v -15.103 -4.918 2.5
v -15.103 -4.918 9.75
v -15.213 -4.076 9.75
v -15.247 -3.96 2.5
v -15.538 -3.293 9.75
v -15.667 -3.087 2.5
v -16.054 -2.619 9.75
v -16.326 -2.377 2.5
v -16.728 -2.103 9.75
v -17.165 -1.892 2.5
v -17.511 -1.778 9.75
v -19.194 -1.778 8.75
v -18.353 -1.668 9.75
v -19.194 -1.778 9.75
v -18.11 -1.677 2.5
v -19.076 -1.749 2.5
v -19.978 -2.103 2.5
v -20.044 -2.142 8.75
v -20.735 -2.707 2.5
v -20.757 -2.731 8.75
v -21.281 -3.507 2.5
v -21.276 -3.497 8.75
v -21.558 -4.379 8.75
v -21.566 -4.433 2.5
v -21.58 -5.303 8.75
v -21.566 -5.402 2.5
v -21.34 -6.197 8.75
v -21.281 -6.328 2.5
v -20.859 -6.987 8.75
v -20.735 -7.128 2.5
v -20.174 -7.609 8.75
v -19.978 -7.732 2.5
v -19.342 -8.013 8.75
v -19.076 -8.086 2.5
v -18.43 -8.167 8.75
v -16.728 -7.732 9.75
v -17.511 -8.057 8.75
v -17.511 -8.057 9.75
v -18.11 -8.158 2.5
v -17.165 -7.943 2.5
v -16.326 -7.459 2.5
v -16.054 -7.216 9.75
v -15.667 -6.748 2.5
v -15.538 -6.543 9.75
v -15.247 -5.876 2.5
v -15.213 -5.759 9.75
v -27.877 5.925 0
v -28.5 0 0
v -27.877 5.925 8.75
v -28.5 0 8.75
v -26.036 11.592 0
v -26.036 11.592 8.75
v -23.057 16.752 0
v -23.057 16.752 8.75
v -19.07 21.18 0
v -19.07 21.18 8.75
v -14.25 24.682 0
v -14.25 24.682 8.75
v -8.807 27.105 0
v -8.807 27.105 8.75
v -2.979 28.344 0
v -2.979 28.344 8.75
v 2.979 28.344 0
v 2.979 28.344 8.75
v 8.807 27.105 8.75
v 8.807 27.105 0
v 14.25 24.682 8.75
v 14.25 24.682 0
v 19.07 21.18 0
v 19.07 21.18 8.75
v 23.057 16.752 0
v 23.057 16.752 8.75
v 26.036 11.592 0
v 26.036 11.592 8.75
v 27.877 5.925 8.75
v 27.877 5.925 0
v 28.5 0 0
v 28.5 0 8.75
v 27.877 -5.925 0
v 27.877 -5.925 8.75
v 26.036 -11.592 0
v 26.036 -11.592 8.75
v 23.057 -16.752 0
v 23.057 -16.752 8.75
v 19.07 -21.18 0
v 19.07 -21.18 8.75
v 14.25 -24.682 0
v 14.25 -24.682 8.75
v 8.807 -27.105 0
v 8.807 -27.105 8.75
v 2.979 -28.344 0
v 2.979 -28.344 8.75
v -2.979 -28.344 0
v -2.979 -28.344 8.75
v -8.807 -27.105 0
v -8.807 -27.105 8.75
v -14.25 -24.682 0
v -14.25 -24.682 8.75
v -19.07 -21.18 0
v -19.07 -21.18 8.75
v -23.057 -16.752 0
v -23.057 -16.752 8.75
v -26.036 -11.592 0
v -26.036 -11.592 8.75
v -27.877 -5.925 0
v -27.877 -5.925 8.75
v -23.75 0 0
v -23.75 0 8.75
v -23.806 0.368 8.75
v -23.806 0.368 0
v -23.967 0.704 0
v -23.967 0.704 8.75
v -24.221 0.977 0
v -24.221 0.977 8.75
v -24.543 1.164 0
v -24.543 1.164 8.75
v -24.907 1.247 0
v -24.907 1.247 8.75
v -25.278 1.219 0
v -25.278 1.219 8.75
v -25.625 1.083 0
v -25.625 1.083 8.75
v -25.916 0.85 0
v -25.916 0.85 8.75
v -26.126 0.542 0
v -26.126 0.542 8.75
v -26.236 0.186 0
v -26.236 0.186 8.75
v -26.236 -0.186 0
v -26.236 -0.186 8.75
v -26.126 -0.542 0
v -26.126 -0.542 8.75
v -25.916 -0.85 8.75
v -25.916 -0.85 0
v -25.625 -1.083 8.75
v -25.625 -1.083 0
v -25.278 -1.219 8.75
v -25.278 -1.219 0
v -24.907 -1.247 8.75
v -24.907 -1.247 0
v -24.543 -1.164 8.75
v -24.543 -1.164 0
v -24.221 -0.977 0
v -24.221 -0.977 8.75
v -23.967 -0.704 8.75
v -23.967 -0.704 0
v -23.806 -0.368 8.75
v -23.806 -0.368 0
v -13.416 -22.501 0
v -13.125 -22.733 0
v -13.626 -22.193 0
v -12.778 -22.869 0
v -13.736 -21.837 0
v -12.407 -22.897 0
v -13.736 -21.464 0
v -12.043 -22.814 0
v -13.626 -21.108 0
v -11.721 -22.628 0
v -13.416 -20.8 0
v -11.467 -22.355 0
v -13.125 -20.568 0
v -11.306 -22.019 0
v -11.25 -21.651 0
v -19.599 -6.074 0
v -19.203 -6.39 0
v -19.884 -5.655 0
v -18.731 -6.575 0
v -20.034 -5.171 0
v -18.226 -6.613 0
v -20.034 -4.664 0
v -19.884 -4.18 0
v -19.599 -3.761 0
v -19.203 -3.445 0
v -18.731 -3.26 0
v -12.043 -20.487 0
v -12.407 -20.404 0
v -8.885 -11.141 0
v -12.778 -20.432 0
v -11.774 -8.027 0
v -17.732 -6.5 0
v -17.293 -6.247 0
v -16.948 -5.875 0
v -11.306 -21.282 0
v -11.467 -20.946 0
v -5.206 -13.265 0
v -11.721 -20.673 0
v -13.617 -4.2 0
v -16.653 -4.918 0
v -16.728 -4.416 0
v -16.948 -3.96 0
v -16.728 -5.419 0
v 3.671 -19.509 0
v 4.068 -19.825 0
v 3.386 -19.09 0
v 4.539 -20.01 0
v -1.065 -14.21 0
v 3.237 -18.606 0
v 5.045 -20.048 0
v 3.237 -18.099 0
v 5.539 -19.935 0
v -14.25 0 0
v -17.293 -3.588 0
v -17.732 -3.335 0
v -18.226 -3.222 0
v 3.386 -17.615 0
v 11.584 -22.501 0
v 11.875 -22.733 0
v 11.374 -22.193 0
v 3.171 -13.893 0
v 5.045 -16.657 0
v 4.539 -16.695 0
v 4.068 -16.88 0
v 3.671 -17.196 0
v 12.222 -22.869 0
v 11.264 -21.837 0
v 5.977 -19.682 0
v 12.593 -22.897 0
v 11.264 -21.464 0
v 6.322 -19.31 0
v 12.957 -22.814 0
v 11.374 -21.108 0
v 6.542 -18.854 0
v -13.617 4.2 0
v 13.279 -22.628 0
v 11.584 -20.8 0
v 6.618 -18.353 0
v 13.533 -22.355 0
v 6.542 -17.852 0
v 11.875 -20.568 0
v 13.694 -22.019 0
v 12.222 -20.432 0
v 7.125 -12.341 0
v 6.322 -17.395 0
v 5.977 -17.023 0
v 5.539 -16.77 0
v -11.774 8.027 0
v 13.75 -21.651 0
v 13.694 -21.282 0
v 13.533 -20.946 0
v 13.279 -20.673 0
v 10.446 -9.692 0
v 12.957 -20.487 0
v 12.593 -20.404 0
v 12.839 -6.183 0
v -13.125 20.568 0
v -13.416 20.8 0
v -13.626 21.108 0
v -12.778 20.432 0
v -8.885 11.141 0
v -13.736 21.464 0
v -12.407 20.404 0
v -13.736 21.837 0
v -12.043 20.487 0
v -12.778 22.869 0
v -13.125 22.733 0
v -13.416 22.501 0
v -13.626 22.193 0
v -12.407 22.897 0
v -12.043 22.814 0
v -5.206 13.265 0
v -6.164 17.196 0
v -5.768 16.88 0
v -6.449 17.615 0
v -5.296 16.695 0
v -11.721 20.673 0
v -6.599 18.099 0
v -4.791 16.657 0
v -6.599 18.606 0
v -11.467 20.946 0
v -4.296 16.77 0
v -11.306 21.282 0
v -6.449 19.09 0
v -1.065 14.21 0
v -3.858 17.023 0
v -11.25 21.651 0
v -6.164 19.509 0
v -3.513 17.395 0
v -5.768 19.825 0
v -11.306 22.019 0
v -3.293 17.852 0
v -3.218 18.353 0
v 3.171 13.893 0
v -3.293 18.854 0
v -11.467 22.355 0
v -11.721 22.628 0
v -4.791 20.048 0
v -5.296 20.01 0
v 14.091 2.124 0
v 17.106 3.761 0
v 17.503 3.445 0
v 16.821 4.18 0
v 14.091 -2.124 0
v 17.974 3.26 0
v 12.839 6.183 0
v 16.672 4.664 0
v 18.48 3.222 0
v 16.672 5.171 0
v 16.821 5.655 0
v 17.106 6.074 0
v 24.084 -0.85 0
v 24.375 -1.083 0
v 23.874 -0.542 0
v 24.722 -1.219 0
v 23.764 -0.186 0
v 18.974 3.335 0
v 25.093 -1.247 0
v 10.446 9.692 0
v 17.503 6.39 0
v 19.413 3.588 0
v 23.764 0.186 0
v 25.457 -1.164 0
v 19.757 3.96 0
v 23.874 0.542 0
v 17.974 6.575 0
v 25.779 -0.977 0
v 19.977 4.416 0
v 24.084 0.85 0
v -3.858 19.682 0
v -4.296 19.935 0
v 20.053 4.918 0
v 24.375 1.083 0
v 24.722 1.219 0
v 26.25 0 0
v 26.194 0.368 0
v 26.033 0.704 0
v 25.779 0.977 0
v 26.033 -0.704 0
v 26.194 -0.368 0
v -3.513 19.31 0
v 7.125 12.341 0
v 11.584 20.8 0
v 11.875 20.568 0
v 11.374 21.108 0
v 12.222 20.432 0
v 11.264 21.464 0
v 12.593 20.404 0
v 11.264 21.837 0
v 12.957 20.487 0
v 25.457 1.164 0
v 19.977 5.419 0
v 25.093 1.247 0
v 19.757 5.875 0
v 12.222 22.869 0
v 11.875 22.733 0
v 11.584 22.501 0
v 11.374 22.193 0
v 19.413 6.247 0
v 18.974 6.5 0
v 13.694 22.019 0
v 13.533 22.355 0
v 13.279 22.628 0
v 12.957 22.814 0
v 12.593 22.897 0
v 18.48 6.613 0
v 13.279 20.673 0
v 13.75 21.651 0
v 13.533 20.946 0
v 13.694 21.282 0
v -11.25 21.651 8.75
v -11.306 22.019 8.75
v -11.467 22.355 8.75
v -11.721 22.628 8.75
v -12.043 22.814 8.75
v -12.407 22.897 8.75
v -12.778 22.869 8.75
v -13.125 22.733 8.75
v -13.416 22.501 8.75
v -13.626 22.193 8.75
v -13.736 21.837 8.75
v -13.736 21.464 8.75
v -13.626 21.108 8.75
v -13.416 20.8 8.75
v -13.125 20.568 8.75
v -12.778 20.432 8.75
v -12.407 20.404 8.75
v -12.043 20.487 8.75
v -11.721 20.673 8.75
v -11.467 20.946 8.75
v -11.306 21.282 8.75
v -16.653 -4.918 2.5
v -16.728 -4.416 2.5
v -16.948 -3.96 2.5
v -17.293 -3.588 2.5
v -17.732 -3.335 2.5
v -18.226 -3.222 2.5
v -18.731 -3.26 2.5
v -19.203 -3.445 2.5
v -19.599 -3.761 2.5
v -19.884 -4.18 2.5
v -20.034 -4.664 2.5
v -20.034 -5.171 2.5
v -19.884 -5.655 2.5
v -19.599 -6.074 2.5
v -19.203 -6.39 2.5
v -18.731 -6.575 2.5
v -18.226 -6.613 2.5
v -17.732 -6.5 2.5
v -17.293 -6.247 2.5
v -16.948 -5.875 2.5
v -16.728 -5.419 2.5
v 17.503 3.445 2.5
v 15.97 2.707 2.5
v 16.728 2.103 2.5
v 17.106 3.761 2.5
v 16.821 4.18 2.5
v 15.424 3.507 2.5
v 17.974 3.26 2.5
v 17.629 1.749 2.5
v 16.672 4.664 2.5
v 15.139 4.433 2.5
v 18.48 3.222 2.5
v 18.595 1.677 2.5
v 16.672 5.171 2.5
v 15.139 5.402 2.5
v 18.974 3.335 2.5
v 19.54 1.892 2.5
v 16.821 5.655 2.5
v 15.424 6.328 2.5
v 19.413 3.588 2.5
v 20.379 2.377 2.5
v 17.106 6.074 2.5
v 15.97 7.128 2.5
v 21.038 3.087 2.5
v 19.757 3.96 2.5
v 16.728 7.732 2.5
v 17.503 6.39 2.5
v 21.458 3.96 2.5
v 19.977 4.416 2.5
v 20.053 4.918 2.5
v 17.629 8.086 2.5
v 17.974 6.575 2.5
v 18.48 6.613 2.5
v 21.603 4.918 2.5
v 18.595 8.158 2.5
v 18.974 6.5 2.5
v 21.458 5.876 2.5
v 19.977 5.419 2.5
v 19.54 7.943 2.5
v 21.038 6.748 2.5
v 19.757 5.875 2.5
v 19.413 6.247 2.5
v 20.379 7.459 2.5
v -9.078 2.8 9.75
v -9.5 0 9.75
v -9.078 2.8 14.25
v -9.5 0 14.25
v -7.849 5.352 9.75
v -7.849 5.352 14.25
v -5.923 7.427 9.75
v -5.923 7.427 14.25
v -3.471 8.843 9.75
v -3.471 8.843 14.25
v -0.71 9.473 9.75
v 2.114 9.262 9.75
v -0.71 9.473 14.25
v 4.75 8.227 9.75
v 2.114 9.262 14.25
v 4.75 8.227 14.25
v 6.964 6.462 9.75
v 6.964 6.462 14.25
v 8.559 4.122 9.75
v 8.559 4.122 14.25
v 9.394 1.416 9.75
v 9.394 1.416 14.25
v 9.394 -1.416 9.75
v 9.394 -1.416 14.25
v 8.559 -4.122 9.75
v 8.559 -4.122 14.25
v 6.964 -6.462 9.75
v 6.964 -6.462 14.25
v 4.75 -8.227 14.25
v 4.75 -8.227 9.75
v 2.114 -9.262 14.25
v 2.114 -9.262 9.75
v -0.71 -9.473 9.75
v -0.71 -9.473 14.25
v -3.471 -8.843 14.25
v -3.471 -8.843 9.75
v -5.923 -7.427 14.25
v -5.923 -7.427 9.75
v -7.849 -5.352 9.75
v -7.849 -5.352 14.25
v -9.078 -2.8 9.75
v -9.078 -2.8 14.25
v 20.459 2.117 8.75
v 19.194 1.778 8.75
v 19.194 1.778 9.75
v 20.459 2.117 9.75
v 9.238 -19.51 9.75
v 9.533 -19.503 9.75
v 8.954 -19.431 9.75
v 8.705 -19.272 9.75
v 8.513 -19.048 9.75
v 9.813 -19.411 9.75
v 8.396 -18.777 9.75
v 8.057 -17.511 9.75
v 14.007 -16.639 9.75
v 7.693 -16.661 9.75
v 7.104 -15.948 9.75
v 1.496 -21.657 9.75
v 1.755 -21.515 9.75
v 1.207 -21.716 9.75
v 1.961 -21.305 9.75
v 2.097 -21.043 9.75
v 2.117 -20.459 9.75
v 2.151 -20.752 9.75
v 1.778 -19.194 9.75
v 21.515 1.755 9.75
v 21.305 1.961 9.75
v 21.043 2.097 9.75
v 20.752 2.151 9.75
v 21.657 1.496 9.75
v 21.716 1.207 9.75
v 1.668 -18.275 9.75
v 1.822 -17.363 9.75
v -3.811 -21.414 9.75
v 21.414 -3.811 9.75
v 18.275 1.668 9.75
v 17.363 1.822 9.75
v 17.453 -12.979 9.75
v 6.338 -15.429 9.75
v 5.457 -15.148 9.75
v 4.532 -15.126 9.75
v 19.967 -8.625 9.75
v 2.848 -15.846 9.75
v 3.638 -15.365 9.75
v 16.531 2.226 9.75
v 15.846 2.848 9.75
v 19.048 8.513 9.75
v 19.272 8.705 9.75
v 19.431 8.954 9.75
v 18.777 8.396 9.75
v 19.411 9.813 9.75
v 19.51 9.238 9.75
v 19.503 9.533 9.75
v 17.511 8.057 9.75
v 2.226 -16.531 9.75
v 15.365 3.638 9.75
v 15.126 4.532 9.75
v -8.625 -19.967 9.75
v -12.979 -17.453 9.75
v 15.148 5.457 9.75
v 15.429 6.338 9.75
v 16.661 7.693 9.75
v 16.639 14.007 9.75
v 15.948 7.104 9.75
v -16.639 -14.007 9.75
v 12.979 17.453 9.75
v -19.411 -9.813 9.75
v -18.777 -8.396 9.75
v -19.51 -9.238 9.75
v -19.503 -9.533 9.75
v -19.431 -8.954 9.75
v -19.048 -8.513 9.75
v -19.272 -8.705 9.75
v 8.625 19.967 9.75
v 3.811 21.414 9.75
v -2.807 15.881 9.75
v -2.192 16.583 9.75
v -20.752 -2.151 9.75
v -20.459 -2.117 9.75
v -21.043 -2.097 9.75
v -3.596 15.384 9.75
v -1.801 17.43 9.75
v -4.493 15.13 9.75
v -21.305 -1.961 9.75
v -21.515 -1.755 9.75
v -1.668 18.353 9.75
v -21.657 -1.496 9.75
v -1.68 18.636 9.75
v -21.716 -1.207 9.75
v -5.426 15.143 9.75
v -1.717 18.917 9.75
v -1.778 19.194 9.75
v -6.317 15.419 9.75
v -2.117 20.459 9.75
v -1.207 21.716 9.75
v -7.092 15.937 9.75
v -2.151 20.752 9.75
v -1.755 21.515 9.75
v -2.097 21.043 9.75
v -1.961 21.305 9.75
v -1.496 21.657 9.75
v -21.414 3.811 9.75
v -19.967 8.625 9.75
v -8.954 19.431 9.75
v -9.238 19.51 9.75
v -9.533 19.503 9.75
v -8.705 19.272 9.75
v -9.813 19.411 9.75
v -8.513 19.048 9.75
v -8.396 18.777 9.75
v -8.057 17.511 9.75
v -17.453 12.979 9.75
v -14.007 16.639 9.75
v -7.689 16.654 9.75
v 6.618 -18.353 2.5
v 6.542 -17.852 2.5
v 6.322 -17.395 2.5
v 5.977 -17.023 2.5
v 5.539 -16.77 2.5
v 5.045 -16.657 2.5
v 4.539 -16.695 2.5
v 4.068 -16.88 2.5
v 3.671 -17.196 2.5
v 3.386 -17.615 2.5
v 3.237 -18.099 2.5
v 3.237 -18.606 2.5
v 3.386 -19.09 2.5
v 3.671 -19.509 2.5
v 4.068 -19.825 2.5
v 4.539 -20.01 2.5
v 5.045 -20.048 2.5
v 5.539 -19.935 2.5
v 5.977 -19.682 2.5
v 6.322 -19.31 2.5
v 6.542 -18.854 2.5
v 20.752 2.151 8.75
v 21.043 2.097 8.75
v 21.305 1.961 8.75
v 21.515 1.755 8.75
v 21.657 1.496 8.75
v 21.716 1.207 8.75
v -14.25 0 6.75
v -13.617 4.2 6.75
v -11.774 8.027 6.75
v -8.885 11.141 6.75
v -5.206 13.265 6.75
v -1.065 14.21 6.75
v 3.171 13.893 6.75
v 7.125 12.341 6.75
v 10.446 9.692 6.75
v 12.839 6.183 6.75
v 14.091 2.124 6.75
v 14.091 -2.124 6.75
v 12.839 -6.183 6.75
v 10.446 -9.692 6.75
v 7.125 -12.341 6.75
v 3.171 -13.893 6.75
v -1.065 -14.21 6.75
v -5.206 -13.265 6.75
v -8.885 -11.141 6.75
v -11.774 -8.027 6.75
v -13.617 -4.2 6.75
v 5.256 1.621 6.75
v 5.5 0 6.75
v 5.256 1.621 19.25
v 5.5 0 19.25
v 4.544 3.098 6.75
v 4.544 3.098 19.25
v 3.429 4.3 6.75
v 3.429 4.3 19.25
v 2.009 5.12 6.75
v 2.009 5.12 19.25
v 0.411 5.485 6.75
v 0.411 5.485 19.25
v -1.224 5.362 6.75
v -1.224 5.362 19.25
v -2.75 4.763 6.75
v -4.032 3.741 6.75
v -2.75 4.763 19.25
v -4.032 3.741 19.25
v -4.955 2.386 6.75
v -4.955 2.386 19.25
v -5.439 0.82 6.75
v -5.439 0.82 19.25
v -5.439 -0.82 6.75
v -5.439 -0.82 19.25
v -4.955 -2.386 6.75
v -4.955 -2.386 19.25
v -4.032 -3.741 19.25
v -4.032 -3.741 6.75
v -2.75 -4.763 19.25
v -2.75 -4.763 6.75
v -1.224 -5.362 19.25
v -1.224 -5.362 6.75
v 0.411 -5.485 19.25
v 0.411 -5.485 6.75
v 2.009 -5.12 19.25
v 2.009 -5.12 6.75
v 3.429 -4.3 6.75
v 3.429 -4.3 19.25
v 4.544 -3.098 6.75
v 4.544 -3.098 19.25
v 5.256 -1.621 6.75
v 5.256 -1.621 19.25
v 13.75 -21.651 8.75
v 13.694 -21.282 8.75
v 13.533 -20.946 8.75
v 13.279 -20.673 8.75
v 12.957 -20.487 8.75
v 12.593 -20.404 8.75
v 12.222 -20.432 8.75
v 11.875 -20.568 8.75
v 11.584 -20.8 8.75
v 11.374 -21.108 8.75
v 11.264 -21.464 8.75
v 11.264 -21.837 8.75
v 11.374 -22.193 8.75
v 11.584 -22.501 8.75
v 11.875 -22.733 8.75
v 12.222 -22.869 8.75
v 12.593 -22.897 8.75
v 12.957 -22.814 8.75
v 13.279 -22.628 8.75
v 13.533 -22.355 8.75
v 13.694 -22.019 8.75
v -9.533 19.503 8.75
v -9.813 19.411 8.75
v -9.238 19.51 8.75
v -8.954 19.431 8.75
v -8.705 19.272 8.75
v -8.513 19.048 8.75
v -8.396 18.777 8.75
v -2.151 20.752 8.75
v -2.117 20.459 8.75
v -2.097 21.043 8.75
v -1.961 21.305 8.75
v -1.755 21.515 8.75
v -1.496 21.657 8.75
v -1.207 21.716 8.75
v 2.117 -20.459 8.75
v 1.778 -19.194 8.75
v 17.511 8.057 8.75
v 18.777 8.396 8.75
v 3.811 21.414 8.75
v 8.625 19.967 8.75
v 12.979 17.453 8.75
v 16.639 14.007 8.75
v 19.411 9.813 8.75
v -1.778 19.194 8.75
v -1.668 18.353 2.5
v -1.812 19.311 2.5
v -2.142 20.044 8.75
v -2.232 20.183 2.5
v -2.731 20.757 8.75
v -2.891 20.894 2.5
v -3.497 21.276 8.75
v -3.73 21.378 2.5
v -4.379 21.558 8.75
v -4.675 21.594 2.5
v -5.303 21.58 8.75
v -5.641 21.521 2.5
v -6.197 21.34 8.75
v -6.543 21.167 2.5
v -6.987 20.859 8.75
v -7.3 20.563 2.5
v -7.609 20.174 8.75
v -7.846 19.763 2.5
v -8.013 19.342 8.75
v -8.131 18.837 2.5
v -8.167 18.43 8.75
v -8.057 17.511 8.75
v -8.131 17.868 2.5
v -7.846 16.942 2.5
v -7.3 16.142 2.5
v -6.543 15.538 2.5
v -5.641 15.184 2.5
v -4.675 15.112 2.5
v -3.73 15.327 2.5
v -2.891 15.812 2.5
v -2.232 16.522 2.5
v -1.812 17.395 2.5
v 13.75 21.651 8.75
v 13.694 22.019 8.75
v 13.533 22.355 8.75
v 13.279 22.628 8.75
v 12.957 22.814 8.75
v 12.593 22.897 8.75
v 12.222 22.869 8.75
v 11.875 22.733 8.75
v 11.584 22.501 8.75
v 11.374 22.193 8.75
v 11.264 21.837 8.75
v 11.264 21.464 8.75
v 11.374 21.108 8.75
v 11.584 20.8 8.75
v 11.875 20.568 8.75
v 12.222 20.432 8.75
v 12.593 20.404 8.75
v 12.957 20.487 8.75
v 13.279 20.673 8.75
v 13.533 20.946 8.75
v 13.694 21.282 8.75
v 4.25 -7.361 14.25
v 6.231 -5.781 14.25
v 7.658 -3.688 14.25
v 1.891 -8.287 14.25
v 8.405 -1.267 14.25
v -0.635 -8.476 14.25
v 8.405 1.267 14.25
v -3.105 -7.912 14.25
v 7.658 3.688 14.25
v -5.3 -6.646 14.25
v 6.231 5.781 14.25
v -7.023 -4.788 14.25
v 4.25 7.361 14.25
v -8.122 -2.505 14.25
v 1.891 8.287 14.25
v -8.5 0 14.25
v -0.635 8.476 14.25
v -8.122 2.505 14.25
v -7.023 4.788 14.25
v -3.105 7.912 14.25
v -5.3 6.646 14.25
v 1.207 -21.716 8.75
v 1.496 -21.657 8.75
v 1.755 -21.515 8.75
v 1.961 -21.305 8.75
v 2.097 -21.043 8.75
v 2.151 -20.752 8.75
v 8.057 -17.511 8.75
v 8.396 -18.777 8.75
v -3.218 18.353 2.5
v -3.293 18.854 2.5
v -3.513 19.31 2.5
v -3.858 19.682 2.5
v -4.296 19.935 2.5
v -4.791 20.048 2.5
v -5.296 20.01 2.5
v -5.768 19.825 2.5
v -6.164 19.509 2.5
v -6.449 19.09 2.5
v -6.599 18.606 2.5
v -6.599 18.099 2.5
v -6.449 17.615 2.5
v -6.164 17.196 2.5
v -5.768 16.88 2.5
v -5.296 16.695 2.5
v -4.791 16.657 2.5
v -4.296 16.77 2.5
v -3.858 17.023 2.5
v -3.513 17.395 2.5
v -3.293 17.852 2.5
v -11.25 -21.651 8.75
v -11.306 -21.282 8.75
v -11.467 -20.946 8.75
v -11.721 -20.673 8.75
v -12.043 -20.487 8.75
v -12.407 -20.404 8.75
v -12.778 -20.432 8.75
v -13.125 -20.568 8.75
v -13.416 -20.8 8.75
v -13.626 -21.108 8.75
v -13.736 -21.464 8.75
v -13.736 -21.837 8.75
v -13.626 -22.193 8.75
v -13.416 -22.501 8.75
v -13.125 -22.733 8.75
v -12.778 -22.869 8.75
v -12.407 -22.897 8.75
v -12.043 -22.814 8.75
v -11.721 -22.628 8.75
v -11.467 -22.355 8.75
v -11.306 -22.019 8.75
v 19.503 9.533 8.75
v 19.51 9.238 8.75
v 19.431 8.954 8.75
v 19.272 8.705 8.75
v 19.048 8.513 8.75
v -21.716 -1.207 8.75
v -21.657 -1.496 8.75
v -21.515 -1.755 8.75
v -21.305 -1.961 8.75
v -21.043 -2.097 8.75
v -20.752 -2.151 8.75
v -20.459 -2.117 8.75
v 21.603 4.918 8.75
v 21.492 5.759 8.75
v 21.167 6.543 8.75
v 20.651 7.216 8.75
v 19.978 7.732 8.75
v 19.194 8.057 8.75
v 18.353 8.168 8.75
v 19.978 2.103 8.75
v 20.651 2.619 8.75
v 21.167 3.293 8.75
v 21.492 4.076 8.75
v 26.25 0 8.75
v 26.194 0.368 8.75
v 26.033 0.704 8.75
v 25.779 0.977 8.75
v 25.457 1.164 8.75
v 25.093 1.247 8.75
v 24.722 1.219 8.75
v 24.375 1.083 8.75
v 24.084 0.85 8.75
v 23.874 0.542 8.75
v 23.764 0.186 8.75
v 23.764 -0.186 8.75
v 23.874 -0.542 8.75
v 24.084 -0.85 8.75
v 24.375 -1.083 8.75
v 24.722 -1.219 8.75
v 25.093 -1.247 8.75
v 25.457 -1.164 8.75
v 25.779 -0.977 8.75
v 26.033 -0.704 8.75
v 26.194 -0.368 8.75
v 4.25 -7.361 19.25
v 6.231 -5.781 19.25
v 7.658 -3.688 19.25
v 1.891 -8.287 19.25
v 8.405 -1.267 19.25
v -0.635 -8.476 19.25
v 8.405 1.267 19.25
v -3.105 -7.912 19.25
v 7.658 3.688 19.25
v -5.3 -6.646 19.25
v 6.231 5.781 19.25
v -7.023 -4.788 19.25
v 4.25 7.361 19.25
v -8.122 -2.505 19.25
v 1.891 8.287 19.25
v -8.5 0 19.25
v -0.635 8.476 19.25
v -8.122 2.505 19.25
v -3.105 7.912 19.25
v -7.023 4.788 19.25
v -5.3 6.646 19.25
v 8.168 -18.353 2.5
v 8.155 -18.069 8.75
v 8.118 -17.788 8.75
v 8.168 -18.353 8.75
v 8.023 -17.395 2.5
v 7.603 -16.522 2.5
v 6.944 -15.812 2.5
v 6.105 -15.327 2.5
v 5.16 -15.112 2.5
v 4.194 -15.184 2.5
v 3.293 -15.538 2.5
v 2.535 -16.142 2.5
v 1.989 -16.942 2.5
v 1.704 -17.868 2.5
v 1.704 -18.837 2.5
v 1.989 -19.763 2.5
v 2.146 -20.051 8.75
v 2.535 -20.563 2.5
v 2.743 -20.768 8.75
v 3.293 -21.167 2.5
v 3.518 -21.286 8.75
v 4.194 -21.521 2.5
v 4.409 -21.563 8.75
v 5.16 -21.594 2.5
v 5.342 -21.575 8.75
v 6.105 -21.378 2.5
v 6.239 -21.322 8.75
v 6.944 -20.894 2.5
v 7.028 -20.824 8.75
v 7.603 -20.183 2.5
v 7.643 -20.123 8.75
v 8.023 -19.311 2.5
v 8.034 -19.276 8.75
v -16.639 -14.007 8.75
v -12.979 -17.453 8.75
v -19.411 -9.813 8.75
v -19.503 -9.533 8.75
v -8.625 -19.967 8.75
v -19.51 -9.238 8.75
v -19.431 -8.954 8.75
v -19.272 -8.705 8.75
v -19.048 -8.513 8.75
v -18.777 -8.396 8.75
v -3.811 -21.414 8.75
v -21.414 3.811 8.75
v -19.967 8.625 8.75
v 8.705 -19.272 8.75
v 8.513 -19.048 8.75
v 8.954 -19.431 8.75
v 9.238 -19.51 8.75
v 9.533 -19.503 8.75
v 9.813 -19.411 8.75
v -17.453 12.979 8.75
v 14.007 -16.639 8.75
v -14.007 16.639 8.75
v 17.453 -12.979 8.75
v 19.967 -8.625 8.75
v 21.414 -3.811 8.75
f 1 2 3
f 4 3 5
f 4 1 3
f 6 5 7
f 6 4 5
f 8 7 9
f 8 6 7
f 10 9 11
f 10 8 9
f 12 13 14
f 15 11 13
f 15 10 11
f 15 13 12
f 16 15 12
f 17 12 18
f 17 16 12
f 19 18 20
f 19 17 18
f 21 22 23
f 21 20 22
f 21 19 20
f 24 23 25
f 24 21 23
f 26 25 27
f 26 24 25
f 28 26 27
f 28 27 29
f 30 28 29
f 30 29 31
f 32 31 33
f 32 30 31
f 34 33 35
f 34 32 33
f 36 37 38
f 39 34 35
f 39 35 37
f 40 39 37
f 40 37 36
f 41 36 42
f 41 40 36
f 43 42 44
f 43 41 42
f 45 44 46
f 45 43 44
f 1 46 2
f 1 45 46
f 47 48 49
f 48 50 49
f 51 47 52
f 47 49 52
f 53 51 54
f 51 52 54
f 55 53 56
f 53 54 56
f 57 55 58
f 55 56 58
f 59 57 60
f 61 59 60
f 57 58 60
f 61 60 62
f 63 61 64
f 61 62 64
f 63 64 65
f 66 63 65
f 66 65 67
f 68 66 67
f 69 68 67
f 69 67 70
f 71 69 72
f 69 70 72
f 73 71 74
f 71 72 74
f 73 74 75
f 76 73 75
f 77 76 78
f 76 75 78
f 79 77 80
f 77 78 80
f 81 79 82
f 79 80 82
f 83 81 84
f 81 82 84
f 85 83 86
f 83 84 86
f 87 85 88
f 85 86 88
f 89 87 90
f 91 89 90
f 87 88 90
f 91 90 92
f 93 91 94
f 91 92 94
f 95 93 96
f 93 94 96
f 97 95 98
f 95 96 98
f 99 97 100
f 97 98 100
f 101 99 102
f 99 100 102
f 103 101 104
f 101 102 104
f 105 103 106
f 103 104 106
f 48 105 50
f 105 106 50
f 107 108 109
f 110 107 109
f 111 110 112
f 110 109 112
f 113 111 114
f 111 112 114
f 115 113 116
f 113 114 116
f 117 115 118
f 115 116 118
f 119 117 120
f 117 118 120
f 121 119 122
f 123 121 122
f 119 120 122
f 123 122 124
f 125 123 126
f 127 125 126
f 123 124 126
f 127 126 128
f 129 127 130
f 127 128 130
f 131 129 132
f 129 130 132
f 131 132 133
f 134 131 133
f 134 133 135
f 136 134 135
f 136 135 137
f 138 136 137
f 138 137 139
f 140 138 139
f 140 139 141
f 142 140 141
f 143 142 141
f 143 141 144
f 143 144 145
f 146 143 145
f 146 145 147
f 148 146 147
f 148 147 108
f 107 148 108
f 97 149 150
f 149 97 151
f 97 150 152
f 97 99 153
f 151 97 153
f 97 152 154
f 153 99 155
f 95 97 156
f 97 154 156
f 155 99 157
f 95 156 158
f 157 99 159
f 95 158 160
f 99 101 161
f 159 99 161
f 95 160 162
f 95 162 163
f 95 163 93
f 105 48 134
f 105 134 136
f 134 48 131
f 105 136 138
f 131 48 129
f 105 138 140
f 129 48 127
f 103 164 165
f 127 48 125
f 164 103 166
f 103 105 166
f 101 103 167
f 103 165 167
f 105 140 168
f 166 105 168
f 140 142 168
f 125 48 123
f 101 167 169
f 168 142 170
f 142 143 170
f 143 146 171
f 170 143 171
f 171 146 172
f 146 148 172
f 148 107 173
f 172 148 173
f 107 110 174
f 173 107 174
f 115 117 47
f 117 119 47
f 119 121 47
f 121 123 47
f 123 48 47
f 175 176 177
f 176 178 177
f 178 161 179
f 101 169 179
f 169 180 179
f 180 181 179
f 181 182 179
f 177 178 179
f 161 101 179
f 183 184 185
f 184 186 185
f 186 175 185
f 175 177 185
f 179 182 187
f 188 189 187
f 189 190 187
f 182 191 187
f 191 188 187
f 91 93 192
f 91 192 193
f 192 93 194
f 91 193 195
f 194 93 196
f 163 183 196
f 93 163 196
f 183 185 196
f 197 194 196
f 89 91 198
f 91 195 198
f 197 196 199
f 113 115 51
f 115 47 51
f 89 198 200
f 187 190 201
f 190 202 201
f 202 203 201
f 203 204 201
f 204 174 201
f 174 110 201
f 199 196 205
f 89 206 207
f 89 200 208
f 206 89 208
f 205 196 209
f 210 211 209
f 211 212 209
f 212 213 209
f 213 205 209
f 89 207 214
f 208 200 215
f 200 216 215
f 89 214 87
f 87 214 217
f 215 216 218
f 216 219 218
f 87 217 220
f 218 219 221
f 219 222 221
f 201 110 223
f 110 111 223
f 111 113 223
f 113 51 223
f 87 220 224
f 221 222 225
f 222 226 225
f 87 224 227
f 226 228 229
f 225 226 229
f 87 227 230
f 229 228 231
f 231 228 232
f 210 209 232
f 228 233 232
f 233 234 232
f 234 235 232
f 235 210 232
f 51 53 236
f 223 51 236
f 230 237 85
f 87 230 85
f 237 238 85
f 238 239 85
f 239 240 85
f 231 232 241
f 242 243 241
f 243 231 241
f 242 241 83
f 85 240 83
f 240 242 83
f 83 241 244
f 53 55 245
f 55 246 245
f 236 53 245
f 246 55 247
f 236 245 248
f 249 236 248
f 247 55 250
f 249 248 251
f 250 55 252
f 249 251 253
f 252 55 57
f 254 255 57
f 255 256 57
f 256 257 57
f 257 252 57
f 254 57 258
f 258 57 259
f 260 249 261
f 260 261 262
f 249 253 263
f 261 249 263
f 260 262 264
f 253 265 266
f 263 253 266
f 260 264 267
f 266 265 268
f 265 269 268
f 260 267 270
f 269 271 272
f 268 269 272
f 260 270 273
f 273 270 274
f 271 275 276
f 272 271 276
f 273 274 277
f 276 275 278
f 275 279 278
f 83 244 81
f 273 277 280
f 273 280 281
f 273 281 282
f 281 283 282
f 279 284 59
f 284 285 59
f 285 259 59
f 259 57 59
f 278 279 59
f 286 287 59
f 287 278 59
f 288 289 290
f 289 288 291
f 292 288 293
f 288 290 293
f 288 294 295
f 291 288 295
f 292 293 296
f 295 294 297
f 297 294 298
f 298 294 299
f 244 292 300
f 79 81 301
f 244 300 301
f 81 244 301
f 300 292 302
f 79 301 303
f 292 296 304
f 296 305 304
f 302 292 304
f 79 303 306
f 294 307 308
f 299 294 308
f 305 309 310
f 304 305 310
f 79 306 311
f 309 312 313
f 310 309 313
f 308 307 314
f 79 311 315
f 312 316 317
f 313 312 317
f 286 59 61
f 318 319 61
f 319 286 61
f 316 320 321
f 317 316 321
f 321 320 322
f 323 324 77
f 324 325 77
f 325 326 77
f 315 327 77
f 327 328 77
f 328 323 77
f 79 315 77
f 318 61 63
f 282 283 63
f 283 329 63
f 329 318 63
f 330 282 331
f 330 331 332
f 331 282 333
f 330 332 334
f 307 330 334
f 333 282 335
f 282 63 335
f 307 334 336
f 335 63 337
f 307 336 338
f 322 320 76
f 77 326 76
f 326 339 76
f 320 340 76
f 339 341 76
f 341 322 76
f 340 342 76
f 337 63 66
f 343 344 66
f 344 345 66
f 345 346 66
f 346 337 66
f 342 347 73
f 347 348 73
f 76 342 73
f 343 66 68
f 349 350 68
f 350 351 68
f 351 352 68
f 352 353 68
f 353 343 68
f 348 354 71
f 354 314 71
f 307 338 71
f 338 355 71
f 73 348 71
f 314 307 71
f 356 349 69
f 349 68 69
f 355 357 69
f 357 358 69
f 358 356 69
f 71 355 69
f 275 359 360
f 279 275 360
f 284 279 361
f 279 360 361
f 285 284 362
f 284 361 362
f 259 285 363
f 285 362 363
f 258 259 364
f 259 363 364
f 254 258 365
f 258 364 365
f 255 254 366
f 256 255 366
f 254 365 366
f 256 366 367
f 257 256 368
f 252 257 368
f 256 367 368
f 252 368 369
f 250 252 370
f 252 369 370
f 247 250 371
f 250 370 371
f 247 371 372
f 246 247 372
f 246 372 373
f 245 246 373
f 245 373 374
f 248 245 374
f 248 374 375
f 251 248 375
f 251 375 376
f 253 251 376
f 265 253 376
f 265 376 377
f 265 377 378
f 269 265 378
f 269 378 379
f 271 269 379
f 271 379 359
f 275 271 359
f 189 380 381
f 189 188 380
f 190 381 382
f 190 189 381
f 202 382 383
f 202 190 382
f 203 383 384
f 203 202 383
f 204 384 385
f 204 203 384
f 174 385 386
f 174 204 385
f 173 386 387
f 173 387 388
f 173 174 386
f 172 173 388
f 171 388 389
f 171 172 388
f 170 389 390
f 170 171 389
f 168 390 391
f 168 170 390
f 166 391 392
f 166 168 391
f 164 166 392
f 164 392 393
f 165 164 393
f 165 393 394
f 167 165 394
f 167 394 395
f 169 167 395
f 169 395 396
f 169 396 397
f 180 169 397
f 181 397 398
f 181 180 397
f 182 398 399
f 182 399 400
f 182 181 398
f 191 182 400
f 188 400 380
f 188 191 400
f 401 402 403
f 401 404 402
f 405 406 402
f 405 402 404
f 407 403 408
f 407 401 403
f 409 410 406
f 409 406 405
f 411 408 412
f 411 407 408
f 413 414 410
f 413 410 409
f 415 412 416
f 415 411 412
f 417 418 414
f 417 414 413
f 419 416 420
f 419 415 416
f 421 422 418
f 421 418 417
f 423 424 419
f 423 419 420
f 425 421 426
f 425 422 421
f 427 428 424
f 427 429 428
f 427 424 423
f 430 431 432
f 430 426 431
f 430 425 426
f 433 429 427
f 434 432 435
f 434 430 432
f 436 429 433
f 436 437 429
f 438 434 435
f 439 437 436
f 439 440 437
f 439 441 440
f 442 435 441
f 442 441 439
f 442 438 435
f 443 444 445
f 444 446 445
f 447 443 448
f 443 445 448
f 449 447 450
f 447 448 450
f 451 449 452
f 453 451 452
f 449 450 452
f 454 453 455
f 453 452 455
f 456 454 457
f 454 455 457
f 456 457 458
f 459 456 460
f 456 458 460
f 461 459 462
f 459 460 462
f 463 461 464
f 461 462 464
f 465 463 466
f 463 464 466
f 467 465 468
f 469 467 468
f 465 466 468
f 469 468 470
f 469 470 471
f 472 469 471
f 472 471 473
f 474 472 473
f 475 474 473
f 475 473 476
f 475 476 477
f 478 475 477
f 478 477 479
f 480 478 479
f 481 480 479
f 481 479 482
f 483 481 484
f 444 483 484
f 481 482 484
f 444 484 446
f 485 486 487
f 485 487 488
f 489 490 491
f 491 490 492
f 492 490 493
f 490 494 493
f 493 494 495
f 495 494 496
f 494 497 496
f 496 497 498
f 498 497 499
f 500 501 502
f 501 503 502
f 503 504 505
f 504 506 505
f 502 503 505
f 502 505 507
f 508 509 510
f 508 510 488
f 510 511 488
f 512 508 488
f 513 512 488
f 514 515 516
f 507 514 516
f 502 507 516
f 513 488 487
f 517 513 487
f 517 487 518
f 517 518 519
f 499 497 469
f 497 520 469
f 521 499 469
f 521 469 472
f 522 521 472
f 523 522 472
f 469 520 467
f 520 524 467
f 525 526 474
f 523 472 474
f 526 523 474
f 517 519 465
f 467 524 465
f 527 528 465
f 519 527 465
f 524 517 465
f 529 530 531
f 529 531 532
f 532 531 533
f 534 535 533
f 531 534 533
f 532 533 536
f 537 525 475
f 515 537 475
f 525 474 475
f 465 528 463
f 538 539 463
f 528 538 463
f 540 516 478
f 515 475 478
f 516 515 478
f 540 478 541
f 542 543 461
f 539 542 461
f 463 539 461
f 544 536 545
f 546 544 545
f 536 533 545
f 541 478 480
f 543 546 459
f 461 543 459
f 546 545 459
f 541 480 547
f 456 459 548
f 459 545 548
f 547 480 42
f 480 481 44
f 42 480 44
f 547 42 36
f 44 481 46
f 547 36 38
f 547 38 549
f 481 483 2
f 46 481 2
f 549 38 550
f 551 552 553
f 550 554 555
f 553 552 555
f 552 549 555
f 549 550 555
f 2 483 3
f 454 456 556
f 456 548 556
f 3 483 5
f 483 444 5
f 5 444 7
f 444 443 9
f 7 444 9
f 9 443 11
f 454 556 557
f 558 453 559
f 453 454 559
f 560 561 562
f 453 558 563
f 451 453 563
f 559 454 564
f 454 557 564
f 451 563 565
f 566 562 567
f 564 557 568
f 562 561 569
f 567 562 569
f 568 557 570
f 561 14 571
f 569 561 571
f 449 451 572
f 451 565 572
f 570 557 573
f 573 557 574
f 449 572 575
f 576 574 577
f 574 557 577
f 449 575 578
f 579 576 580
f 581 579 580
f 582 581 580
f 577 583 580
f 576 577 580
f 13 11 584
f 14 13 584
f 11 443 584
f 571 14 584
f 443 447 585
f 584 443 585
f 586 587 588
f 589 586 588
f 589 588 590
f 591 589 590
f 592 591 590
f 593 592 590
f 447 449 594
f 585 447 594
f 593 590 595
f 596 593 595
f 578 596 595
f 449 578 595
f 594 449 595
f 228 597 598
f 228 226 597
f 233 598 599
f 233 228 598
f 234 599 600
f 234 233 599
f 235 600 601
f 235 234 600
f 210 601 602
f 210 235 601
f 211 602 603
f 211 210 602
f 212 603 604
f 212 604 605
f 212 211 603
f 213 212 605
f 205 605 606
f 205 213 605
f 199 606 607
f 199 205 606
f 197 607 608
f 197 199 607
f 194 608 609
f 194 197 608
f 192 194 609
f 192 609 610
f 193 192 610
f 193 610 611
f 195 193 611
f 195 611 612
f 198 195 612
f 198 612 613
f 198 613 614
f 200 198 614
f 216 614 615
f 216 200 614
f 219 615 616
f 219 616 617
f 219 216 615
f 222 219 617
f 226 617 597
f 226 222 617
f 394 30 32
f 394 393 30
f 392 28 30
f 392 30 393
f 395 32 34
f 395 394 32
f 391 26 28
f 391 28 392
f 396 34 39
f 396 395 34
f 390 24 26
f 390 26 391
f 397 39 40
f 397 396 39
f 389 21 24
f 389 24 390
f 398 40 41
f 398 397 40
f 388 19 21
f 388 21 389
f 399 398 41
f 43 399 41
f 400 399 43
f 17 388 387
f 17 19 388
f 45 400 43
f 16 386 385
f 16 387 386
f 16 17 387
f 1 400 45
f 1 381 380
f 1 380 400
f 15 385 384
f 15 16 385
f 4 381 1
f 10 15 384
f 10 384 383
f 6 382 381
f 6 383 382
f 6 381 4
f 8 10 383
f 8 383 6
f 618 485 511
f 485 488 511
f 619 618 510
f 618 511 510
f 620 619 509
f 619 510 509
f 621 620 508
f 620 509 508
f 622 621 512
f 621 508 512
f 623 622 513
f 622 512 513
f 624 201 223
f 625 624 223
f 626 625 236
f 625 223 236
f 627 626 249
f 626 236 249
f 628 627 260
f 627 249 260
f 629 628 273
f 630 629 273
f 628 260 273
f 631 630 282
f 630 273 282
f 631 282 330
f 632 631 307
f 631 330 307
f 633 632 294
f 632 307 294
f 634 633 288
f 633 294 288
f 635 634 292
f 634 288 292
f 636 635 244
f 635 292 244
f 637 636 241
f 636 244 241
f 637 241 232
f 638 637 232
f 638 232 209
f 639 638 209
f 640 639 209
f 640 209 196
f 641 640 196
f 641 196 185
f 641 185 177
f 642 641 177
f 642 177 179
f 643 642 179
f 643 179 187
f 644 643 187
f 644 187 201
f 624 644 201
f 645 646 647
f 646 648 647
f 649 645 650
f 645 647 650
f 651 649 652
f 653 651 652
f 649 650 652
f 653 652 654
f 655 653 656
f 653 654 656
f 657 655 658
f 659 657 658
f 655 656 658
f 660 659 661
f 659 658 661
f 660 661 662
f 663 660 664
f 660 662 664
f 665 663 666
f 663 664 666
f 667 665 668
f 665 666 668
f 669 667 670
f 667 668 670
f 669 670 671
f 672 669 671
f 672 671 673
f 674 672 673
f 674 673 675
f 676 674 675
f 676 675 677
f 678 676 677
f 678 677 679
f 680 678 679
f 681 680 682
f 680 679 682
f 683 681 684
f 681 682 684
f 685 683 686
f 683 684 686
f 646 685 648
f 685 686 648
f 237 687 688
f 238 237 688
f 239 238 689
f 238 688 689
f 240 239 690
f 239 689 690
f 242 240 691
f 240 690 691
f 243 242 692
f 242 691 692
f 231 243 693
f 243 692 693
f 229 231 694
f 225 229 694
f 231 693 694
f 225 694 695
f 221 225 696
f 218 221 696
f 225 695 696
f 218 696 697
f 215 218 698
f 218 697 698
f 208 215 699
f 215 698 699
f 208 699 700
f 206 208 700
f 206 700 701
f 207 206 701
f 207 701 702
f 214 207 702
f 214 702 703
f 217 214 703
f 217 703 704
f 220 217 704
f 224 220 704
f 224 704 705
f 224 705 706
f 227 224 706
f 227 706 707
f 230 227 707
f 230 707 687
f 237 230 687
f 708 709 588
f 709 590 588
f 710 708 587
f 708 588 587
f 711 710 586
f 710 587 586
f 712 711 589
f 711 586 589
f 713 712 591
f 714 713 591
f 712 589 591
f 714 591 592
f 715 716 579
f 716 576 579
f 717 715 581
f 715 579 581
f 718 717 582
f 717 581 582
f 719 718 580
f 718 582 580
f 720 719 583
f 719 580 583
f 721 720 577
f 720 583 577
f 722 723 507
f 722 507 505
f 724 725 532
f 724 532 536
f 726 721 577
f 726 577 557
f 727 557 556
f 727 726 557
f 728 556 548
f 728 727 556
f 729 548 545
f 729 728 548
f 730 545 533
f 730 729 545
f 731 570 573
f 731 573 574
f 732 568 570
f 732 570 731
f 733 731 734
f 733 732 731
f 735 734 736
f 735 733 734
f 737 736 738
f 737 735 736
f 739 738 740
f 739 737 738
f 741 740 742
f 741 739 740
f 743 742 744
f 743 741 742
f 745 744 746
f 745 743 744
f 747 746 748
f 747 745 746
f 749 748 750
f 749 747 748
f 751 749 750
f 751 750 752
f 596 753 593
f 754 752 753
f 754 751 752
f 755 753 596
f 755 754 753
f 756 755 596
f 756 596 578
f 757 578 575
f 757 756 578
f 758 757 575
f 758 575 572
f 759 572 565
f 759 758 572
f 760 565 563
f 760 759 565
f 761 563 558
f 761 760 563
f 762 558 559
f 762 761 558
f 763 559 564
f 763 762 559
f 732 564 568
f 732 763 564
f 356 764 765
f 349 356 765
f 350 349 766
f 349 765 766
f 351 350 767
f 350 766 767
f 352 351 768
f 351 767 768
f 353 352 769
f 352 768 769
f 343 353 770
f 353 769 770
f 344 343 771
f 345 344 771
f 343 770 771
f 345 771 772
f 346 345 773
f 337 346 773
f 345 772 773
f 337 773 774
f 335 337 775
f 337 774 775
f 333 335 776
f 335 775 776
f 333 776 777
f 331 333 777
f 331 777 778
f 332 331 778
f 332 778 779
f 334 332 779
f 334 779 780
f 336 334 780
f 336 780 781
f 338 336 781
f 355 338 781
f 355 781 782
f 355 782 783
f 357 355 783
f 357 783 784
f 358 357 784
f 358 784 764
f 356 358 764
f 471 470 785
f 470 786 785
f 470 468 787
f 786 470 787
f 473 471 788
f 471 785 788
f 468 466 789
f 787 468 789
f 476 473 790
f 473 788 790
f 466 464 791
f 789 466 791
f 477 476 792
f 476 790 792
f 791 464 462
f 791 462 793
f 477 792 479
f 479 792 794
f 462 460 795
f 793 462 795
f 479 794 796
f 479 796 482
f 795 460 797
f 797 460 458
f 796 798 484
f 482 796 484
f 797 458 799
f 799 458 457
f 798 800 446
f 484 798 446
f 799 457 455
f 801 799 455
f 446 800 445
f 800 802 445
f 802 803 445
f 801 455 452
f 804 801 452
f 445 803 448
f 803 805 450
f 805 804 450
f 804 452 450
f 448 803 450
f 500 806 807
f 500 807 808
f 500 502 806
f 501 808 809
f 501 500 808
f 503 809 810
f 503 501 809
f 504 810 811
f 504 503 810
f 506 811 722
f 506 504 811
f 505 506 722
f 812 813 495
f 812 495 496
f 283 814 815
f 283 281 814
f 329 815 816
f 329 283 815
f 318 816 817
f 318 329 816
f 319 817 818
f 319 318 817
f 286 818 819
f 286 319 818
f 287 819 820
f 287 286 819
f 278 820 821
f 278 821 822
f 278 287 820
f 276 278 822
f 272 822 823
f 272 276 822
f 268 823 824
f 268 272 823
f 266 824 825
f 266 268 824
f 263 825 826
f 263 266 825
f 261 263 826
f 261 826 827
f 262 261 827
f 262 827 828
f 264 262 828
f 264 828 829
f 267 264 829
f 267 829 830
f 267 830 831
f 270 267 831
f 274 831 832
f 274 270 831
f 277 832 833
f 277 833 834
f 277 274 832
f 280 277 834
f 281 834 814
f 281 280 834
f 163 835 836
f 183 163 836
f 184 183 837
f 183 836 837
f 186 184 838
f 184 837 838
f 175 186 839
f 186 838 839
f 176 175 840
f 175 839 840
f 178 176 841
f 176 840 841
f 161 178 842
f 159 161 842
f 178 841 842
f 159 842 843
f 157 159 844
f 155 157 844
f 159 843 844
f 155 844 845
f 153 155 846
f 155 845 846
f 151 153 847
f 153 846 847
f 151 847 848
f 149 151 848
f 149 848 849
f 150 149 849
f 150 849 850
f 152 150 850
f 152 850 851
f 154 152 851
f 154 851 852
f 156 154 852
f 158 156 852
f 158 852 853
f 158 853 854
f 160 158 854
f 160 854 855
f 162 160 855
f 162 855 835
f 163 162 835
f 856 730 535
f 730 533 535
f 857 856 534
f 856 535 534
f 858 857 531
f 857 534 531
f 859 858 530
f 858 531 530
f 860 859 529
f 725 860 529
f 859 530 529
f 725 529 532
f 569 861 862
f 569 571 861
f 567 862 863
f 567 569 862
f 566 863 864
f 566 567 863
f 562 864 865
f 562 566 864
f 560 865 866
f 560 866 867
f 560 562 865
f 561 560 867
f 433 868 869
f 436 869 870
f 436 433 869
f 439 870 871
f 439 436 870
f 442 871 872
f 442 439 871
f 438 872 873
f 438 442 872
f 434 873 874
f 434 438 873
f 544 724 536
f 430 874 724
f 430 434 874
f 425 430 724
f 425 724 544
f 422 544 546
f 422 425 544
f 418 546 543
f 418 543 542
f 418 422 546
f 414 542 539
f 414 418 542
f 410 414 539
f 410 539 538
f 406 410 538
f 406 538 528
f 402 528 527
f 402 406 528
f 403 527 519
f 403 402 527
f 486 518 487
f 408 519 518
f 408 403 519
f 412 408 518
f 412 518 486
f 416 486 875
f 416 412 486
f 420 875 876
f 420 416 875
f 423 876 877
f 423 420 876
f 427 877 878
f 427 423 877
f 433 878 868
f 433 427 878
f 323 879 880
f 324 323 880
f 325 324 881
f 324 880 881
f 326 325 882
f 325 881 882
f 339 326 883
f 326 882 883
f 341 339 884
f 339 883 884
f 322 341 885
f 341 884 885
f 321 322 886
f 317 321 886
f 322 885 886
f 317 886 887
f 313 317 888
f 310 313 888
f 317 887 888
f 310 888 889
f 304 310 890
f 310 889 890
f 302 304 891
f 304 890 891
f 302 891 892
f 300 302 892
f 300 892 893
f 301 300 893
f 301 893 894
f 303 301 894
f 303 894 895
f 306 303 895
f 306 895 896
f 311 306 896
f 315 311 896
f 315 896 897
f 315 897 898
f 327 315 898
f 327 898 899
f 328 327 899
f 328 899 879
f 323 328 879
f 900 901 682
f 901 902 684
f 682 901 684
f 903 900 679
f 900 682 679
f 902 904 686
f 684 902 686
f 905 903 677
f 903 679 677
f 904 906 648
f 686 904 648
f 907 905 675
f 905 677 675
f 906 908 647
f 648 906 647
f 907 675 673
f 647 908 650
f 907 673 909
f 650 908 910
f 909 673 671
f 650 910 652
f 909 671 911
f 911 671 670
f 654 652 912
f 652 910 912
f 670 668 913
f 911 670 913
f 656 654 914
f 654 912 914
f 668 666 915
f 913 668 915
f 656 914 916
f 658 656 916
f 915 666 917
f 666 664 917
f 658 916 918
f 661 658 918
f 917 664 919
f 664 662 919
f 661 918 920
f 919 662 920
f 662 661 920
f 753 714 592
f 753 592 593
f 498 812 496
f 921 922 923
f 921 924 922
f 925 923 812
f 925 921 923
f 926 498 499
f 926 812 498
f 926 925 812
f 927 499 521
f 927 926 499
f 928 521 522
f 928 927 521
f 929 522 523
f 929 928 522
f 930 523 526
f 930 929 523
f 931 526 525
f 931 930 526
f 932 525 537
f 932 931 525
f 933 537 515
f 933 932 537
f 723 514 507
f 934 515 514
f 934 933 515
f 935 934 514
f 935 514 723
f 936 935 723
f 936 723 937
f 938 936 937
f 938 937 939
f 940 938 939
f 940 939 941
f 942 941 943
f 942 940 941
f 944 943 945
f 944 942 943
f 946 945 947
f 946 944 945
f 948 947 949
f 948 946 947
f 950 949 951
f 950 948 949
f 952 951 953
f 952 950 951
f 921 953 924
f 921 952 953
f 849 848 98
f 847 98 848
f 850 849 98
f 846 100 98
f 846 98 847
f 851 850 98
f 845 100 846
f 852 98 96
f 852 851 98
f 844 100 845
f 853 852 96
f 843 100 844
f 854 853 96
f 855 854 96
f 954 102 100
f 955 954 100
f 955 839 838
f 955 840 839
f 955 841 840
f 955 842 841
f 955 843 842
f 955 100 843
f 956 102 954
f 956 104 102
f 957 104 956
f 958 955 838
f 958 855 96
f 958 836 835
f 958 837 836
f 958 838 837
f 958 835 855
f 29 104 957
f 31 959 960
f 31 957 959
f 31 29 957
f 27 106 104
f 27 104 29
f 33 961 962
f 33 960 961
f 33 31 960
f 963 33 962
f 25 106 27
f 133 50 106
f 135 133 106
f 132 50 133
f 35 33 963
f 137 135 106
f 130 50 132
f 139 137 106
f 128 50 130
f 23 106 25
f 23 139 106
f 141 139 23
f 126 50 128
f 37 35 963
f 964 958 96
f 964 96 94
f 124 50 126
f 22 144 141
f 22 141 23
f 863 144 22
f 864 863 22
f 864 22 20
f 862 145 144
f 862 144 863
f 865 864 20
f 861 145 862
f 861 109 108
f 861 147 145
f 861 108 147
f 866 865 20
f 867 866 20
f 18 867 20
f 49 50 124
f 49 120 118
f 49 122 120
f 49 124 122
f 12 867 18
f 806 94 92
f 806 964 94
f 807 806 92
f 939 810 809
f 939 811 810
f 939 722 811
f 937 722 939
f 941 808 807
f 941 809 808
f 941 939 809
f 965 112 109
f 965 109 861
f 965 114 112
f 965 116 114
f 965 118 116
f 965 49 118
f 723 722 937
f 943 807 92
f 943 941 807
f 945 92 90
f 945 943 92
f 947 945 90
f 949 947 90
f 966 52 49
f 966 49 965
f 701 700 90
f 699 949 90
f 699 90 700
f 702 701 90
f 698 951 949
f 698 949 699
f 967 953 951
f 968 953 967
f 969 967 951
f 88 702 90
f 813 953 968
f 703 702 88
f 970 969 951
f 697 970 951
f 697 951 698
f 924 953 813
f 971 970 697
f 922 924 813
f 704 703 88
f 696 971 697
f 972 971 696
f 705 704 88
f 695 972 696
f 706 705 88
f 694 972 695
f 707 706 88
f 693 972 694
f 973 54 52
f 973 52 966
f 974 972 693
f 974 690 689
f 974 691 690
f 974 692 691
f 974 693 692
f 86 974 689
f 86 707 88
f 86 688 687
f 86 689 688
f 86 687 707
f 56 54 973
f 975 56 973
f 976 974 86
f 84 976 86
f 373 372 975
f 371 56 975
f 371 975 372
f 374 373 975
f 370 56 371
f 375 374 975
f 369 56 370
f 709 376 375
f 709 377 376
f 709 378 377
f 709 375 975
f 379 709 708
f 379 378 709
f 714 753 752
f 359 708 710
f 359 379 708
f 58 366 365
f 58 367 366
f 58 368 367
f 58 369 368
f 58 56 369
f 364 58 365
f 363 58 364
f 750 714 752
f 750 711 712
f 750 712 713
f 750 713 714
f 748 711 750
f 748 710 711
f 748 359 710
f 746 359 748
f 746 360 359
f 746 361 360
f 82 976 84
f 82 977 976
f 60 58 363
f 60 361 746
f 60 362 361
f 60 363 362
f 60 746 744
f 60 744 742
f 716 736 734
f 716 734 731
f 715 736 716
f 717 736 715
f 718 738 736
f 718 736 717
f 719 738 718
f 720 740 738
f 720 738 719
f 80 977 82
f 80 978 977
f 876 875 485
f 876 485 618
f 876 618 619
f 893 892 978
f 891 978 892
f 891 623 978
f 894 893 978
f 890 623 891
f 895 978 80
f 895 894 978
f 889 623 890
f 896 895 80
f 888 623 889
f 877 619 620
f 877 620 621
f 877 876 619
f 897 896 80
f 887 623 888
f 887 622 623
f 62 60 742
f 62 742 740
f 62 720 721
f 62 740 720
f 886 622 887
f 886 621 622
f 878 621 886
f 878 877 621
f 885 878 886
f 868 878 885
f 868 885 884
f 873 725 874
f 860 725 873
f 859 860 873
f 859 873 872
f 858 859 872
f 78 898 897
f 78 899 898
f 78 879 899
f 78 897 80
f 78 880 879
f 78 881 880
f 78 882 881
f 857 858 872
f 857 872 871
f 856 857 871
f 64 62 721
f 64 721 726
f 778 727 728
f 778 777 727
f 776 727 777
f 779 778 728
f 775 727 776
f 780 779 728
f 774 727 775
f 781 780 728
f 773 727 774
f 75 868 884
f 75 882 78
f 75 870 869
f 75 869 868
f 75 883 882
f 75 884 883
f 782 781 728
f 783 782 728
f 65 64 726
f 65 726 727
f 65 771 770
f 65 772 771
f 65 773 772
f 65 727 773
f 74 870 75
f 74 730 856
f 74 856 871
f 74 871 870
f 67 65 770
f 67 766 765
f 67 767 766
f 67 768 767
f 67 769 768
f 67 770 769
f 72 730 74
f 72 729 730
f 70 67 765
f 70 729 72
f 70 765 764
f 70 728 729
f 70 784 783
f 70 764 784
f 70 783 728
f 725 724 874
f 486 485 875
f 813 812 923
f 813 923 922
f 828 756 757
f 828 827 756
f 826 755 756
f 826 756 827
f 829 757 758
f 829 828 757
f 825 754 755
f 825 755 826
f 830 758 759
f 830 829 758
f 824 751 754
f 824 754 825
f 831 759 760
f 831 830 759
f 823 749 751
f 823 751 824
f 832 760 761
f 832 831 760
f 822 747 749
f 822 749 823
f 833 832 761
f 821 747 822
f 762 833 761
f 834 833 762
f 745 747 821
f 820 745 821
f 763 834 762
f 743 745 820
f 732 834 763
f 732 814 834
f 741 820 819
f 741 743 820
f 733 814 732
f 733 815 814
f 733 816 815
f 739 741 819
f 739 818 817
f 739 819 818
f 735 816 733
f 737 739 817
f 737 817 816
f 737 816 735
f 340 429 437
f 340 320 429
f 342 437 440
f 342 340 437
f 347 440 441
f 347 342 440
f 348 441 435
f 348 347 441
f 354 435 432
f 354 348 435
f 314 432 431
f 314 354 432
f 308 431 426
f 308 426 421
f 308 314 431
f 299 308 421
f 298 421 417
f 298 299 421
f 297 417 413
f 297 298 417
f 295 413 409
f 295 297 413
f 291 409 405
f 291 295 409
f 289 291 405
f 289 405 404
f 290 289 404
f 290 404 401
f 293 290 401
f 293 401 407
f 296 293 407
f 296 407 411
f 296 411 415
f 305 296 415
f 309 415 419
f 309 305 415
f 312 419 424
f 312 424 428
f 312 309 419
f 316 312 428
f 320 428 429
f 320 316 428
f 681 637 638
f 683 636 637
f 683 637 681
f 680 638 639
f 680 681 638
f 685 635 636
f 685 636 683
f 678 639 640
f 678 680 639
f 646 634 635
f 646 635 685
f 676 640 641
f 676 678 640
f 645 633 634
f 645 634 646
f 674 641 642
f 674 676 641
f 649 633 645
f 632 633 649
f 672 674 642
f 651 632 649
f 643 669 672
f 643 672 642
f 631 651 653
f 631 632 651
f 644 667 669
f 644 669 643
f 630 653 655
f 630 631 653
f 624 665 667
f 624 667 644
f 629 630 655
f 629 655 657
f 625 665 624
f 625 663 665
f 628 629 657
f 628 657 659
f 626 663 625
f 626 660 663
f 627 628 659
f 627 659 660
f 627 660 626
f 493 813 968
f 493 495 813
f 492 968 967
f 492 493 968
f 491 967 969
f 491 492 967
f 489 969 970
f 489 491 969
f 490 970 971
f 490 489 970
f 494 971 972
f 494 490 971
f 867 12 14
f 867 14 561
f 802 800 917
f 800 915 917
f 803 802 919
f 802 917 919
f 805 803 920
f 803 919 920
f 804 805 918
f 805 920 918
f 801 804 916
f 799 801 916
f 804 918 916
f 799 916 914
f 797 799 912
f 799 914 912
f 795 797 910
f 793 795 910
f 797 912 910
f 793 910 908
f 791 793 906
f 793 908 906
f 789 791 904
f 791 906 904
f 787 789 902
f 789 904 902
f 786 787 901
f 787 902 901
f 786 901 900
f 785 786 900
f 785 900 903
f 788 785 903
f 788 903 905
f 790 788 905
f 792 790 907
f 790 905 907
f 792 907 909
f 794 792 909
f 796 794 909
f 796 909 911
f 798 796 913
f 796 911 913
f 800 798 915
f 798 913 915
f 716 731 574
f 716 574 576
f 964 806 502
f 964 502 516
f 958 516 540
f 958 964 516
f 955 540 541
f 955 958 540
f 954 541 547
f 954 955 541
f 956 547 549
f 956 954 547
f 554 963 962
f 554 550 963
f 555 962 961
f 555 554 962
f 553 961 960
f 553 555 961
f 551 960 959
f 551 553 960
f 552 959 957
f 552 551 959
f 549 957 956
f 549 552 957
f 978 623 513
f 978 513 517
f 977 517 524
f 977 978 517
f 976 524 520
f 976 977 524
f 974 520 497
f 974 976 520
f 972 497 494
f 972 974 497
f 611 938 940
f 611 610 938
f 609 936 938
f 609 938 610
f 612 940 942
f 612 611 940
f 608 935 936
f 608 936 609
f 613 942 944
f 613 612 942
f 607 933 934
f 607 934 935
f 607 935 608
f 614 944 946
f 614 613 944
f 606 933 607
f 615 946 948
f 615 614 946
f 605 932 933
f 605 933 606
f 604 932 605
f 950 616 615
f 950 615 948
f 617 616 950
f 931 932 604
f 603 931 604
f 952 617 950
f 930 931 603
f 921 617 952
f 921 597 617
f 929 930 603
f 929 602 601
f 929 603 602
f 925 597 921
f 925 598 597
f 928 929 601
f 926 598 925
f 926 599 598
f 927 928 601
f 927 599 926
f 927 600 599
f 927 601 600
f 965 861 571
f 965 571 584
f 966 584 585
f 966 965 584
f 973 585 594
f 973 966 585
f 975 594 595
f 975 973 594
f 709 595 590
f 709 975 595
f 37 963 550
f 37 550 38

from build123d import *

# Parameters (mm, degrees)
SKETCH_1_W                    = 28.5
SKETCH_1_H                    = 8.75
EXTRUDE_1_DEPTH               = 1
HOLE_WIZARD_M10_1_D           = 11
HOLE_WIZARD_M10_1_CBORE_D     = 28.5
HOLE_WIZARD_M10_1_CBORE_DEPTH = 6.75
HOLE_WIZARD_2_5_2_5_1_D       = 2.5
HOLE_WIZARD_2_5_2_5_1_DEPTH   = 19.25
FILLET_1_R                    = 1


with BuildPart() as part:
    # 草图1 → 旋转1 (revolve)
    with BuildSketch(Plane.XZ, mode=Mode.PRIVATE) as revolve_1_sk:
        with Locations((14.25, 4.375)):
            Rectangle(SKETCH_1_W, SKETCH_1_H)
    revolve(revolve_1_sk.sketch.rotate(Axis((0, 0, 8.75), (0, 0, -1)), 180), axis=Axis((0, 0, 8.75), (0, 0, -1)))

    # 草图2 → 凸台-拉伸1 (add)
    with BuildSketch(Plane.XY.offset(8.75)):
        with BuildLine():
            Line((-8.705372964, 19.931858457), (-8.056820792, 17.511428803))
            ThreePointArc((-8.056820792, 17.511428803), (-5.758723754, 21.491849635), (-1.778302922, 19.193752596))
            Line((-1.778302922, 19.193752596), (-2.426855093, 21.614182251))
            ThreePointArc((-2.426855093, 21.614182251), (10.875, 18.836052532), (19.931858457, 8.705372964))
            Line((19.931858457, 8.705372964), (17.511428803, 8.056820792))
            ThreePointArc((17.511428803, 8.056820792), (21.491849635, 5.758723754), (19.193752596, 1.778302922))
            Line((19.193752596, 1.778302922), (21.614182251, 2.426855093))
            ThreePointArc((21.614182251, 2.426855093), (18.836052532, -10.875), (8.705372964, -19.931858457))
            Line((8.705372964, -19.931858457), (8.056820792, -17.511428803))
            ThreePointArc((8.056820792, -17.511428803), (5.758723754, -21.491849635), (1.778302922, -19.193752596))
            Line((1.778302922, -19.193752596), (2.426855093, -21.614182251))
            ThreePointArc((2.426855093, -21.614182251), (-10.875, -18.836052532), (-19.931858457, -8.705372964))
            Line((-19.931858457, -8.705372964), (-17.511428803, -8.056820792))
            ThreePointArc((-17.511428803, -8.056820792), (-21.491849635, -5.758723754), (-19.193752596, -1.778302922))
            Line((-19.193752596, -1.778302922), (-21.614182251, -2.426855093))
            ThreePointArc((-21.614182251, -2.426855093), (-18.836052532, 10.875), (-8.705372964, 19.931858457))
        make_face()
    extrude(amount=EXTRUDE_1_DEPTH)

    # 草图3 → 旋转2 (revolve)
    with BuildSketch(Plane.XZ, mode=Mode.PRIVATE) as revolve_2_sk:
        Polygon((8.5, 19.25), (0, 19.25), (0, 9.75), (9.5, 9.75), (9.5, 14.25), (8.5, 14.25), align=None)
    revolve(revolve_2_sk.sketch.rotate(Axis((0, 0, 19.25), (0, 0, -1)), 180), axis=Axis((0, 0, 19.25), (0, 0, -1)))

    # 草图4 → 切除-旋转1 (revolve, cut)
    with BuildSketch(Plane(origin=(0, -18.352590699, 0), x_dir=(1, 0, 0), z_dir=(0, 1, 0))):
        Polygon((6.617561857, 0), (4.917561857, 0), (4.917561857, -9.75), (8.167561857, -9.75), (8.167561857, -2.5), (6.617561857, -2.5), align=None)
    revolve(axis=Axis((4.917561857, -18.352590699, 0), (0, 0, 1)), mode=Mode.SUBTRACT)

    # 草图5 → 切除-旋转2 (revolve, cut)
    with BuildSketch(Plane(origin=(0, -4.917561857, 0), x_dir=(1, 0, 0), z_dir=(0, 1, 0))):
        Polygon((-16.652590699, 0), (-18.352590699, 0), (-18.352590699, -9.75), (-15.102590699, -9.75), (-15.102590699, -2.5), (-16.652590699, -2.5), align=None)
    revolve(axis=Axis((-18.352590699, -4.917561857, 0), (0, 0, 1)), mode=Mode.SUBTRACT)

    # 草图6 → 切除-旋转3 (revolve, cut)
    with BuildSketch(Plane(origin=(0, 18.352590699, 0), x_dir=(1, 0, 0), z_dir=(0, 1, 0))):
        Polygon((-3.217561857, 0), (-4.917561857, 0), (-4.917561857, -9.75), (-1.667561857, -9.75), (-1.667561857, -2.5), (-3.217561857, -2.5), align=None)
    revolve(axis=Axis((-4.917561857, 18.352590699, 0), (0, 0, 1)), mode=Mode.SUBTRACT)

    # 草图7 → 切除-旋转4 (revolve, cut)
    with BuildSketch(Plane(origin=(0, 4.917561857, 0), x_dir=(1, 0, 0), z_dir=(0, 1, 0))):
        Polygon((20.052590699, 0), (18.352590699, 0), (18.352590699, -9.75), (21.602590699, -9.75), (21.602590699, -2.5), (20.052590699, -2.5), align=None)
    revolve(axis=Axis((18.352590699, 4.917561857, 0), (0, 0, 1)), mode=Mode.SUBTRACT)

    # M10 六角头螺栓的柱形沉头孔1 (through all)
    with Locations(Plane(origin=(0, 0, 0), x_dir=(-1, 0, 0), z_dir=(0, 0, -1))):
        with Locations((0, 0)):
            CounterBoreHole(HOLE_WIZARD_M10_1_D / 2, HOLE_WIZARD_M10_1_CBORE_D / 2, HOLE_WIZARD_M10_1_CBORE_DEPTH)

    # Ø2.5 (2.5) 直径孔1
    with Locations(Plane(origin=(0, 0, 0), x_dir=(-1, 0, 0), z_dir=(0, 0, -1))):
        with Locations((-25, 0), (-12.5, 21.650635095), (12.5, 21.650635095), (25, 0), (12.5, -21.650635095), (-12.5, -21.650635095)):
            Hole(HOLE_WIZARD_2_5_2_5_1_D / 2, depth=HOLE_WIZARD_2_5_2_5_1_DEPTH)

    # 圆角1
    fillet_1_edges = [part.edges().sort_by_distance(p)[0] for p in [
        (-8.705372964, 19.931858457, 9.25),
        (-21.614182251, -2.426855093, 9.25),
        (-19.931858457, -8.705372964, 9.25),
        (2.426855093, -21.614182251, 9.25),
        (8.705372964, -19.931858457, 9.25),
        (21.614182251, 2.426855093, 9.25),
        (19.931858457, 8.705372964, 9.25),
        (-2.426855093, 21.614182251, 9.25),
    ]]
    fillet(fillet_1_edges, radius=FILLET_1_R)


solid = part.part
